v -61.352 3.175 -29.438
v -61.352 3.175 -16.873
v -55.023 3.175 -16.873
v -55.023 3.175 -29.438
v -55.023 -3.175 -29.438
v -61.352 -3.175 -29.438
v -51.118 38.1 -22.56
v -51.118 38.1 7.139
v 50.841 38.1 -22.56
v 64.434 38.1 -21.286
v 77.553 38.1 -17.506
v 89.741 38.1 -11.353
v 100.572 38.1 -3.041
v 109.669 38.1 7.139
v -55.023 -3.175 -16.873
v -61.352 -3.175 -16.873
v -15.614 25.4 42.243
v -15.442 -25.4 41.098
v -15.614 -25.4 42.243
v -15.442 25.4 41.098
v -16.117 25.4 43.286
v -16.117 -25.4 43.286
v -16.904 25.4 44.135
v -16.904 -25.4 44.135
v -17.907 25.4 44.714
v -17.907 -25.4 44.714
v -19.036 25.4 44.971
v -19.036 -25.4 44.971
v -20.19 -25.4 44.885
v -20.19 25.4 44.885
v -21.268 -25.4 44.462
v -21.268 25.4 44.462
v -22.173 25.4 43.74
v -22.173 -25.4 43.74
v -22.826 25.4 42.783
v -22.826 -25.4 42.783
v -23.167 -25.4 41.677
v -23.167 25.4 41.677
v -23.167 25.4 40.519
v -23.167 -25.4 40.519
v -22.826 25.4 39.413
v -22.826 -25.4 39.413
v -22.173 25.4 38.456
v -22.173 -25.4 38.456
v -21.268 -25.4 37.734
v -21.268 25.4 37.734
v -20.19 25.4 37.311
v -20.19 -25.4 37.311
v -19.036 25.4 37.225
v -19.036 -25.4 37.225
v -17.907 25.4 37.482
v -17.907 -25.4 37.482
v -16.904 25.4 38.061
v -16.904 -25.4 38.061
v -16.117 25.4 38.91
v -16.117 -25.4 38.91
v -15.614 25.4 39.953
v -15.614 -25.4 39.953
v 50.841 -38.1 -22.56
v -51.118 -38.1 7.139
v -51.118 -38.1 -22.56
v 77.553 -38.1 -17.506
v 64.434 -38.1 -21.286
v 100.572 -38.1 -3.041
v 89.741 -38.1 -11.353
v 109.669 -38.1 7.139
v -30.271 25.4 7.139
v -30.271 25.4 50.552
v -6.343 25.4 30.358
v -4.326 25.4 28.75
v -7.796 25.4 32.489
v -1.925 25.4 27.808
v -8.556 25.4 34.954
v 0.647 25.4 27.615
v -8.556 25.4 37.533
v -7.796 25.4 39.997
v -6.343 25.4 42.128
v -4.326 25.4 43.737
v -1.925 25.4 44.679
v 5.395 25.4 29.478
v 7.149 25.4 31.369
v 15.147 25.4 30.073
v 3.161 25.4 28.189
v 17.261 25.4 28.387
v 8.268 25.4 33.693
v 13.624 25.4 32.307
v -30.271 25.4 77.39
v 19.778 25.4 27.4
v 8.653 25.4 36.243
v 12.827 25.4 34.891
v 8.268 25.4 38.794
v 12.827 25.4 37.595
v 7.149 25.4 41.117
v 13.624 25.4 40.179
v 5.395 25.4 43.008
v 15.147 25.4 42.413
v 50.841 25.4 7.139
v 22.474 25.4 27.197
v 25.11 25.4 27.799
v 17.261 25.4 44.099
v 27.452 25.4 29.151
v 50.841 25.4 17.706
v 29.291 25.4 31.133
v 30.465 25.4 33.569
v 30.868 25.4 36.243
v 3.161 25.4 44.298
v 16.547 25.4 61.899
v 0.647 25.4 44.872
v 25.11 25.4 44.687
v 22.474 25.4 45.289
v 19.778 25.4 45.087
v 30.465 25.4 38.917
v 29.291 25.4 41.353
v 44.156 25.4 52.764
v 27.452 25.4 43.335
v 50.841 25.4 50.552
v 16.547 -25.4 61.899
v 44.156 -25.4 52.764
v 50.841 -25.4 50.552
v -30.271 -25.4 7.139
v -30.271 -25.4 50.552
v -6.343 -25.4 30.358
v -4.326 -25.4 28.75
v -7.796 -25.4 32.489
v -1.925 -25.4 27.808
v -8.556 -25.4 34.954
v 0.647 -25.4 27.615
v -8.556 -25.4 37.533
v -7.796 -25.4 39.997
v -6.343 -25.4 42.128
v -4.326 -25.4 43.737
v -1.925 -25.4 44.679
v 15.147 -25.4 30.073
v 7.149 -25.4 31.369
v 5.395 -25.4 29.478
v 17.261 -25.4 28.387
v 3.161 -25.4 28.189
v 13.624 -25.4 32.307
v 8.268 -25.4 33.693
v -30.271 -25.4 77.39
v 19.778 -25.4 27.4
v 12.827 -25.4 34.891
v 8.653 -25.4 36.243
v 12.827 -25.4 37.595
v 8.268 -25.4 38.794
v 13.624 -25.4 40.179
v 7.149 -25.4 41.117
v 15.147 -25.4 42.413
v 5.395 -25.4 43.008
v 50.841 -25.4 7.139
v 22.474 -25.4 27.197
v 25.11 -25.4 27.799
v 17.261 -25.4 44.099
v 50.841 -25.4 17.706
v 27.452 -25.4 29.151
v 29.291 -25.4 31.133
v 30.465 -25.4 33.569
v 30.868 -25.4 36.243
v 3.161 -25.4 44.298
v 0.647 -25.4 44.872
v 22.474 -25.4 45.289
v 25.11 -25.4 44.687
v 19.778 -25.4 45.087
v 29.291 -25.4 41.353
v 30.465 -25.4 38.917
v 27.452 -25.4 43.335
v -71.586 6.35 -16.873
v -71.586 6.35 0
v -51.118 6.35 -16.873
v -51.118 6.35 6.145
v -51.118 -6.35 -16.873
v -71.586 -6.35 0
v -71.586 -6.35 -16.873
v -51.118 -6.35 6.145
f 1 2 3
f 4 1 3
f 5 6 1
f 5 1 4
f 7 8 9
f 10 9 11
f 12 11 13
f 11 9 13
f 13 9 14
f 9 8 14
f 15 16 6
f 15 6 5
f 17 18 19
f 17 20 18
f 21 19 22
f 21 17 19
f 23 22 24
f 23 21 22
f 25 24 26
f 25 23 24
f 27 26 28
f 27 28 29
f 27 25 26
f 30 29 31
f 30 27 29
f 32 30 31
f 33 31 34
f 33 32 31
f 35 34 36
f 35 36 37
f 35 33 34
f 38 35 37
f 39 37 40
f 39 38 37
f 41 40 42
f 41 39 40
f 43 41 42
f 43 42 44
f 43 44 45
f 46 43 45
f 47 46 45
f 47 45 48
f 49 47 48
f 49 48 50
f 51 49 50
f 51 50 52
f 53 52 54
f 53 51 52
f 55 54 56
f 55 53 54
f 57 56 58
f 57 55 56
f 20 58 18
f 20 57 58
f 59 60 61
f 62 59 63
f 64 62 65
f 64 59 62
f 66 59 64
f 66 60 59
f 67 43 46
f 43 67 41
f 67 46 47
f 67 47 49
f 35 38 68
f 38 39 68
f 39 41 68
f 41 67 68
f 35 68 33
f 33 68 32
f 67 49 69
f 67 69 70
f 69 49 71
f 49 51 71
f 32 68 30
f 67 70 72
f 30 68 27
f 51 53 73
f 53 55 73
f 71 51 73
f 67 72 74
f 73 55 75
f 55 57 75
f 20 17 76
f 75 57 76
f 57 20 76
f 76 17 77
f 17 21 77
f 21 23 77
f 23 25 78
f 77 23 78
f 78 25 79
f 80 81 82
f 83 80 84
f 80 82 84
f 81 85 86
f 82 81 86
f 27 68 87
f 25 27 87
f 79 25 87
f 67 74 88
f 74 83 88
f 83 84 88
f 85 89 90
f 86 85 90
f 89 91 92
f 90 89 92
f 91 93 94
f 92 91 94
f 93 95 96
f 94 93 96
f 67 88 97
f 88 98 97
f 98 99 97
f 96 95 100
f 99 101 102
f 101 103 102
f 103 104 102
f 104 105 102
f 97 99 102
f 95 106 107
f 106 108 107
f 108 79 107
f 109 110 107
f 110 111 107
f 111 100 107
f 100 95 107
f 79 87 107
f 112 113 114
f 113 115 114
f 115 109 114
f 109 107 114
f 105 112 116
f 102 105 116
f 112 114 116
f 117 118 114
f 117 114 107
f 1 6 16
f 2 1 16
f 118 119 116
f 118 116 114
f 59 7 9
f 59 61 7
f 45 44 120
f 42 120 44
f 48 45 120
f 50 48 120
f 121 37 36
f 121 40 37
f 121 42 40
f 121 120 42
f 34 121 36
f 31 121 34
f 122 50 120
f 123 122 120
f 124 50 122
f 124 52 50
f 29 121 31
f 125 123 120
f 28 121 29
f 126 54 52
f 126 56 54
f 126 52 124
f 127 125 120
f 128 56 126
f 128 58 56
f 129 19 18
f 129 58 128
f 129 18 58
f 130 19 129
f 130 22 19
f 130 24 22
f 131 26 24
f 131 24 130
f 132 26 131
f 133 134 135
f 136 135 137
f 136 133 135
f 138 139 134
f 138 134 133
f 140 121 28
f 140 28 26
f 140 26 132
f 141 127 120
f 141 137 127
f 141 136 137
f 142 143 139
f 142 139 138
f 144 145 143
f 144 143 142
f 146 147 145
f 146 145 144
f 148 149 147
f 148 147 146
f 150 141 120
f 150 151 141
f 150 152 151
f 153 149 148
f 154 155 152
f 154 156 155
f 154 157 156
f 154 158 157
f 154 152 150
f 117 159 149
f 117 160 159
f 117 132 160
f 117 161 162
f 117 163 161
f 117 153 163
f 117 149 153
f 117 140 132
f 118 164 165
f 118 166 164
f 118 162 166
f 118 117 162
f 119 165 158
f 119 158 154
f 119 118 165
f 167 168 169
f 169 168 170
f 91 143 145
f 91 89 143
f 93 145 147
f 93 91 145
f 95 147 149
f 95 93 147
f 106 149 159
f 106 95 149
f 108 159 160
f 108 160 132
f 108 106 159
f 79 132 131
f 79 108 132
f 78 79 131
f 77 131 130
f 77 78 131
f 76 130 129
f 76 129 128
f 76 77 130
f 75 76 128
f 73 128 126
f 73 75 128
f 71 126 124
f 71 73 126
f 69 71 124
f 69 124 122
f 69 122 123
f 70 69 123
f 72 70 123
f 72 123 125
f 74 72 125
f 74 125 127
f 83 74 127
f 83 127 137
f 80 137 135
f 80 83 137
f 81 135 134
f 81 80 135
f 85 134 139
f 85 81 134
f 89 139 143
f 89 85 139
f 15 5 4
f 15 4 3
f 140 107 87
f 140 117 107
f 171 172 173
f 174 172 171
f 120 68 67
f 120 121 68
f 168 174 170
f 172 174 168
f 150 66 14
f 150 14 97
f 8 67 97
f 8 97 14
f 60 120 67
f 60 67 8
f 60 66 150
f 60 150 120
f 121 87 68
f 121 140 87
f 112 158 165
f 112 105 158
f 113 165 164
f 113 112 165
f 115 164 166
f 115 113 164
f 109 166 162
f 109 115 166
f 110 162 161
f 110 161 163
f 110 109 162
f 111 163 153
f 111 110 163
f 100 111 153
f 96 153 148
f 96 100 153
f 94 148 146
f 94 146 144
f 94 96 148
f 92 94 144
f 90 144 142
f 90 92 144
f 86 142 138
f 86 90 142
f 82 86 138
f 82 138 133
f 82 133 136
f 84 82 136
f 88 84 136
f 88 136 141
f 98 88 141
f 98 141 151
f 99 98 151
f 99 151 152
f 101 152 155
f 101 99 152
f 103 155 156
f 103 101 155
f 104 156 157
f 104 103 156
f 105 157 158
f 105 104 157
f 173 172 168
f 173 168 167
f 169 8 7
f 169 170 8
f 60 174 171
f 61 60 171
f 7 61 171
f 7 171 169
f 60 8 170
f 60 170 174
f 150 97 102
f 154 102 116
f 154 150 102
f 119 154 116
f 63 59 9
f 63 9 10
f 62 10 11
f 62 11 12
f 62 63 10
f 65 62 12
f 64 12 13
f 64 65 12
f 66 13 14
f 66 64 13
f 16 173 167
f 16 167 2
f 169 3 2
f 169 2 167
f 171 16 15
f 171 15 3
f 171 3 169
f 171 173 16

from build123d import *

# Parameters (mm, degrees)
F1_DEPTH = 38.1
F2_DEPTH = 6.35
F0_W     = 6.3290558755
F0_H     = 12.5651992857
F3_DEPTH = 3.175
F0_R     = 8.6525424745
F0_R_2   = 9.0711492587
F0_W_2   = 5.1460258761
F0_H_2   = 10.5661942953
F0_W_3   = 24.5602354407
F0_W_4   = 26.5593226068
F0_W_5   = 6.9090700396
F0_W_6   = 14.06177961
F0_W_7   = 3.8753339521
F0_R_3   = 3.8842075561
F4_DEPTH = 25.4


with BuildPart() as f1:
    # F0 (on Front) → F1 (new body, symmetric)
    with BuildSketch(Plane.XZ):
        with BuildLine():
            Line((-51.1175096035, -16.873287037), (-51.1175096035, -22.5602444261))
            Line((-51.1175096035, -22.5602444261), (50.8410625258, -22.5602444261))
            ThreePointArc((50.8410625258, -22.5602444261), (83.7910011304, -14.7143733495), (109.6690327028, 7.1393135004))
            Line((109.6690327028, 7.1393135004), (93.1019932032, 7.1393135004))
            Line((93.1019932032, 7.1393135004), (71.9687715173, 7.1393135004))
            Line((71.9687715173, 7.1393135004), (50.8410625258, 7.1393135004))
            Line((50.8410625258, 7.1393135004), (45.6950366497, 7.1393135004))
            Line((45.6950366497, 7.1393135004), (21.134801209, 7.1393135004))
            Line((21.134801209, 7.1393135004), (-5.4245213978, 7.1393135004))
            Line((-5.4245213978, 7.1393135004), (-12.3335914374, 7.1393135004))
            Line((-12.3335914374, 7.1393135004), (-26.3953710475, 7.1393135004))
            Line((-26.3953710475, 7.1393135004), (-30.2707049996, 7.1393135004))
            Line((-30.2707049996, 7.1393135004), (-51.1175096035, 7.1393135004))
            Line((-51.1175096035, 7.1393135004), (-51.1175096035, 6.1453658742))
            Line((-51.1175096035, 6.1453658742), (-51.1175096035, -16.873287037))
        make_face()
    extrude(amount=F1_DEPTH, both=True)

    # F0 (on Front) → F2 (join, symmetric)
    with BuildSketch(Plane.XZ):
        Polygon((-55.0226159394, -16.873287037), (-51.1175096035, -16.873287037), (-51.1175096035, 6.1453658742), (-71.5858340263, 0), (-71.5858340263, -16.873287037), (-61.3516718149, -16.873287037), align=None)
    extrude(amount=F2_DEPTH, both=True)

    # F0 (on Front) → F3 (join, symmetric)
    with BuildSketch(Plane.XZ):
        with Locations((-58.1871438771, -23.1558866799)):
            Rectangle(F0_W, F0_H)
    extrude(amount=F3_DEPTH, both=True)

    # F0 (on Front) → F4 (join, symmetric)
    with BuildSketch(Plane.XZ):
        with BuildLine():
            Line((-30.2707049996, 50.5518508265), (-30.2707049996, 17.7055077956))
            Line((-30.2707049996, 17.7055077956), (-26.3953710475, 17.7055077956))
            Line((-26.3953710475, 17.7055077956), (-26.3953710475, 42.5316623055))
            add(Edge.make_bspline(
                [(-26.3953710475, 42.5316623055), (-25.6086271256, 50.5518508265), (-13.6145753786, 50.5218580365), (-12.3335914374, 42.5316623055)],
                knots=[0, 0, 0, 0, 14.06177961, 14.06177961, 14.06177961, 14.06177961], degree=3))
            Line((-12.3335914374, 42.5316623055), (-12.3335914374, 17.7055077956))
            Line((-12.3335914374, 17.7055077956), (-5.4245213978, 17.7055077956))
            Line((-5.4245213978, 17.7055077956), (21.134801209, 17.7055077956))
            Line((21.134801209, 17.7055077956), (45.6950366497, 17.7055077956))
            Line((45.6950366497, 17.7055077956), (50.8410625258, 17.7055077956))
            Line((50.8410625258, 17.7055077956), (50.8410625258, 50.5518508265))
            Line((50.8410625258, 50.5518508265), (-30.2707049996, 50.5518508265))
        make_face()
        with Locations((0, 36.2432263792)):
            Circle(F0_R, mode=Mode.SUBTRACT)
        with Locations((21.7964369804, 36.2432301044)):
            Circle(F0_R_2, mode=Mode.SUBTRACT)
        with Locations((48.2680495878, 12.422410648)):
            Rectangle(F0_W_2, F0_H_2)
        with Locations((33.4149189293, 12.422410648)):
            Rectangle(F0_W_3, F0_H_2)
        with Locations((7.8551399056, 12.422410648)):
            Rectangle(F0_W_4, F0_H_2)
        with Locations((-8.8790564176, 12.422410648)):
            Rectangle(F0_W_5, F0_H_2)
        with Locations((-19.3644812425, 12.422410648)):
            Rectangle(F0_W_6, F0_H_2)
        with Locations((-28.3330380235, 12.422410648)):
            Rectangle(F0_W_7, F0_H_2)
        with BuildLine():
            Line((-26.3953710475, 42.5316623055), (-26.3953710475, 17.7055077956))
            Line((-26.3953710475, 17.7055077956), (-12.3335914374, 17.7055077956))
            Line((-12.3335914374, 17.7055077956), (-12.3335914374, 42.5316623055))
            add(Edge.make_bspline(
                [(-26.3953710475, 42.5316623055), (-25.6086271256, 50.5518508265), (-13.6145753786, 50.5218580365), (-12.3335914374, 42.5316623055)],
                knots=[0, 0, 0, 0, 14.06177961, 14.06177961, 14.06177961, 14.06177961], degree=3))
        make_face()
        with Locations((-19.3260274827, 41.0979650915)):
            Circle(F0_R_3, mode=Mode.SUBTRACT)
        Polygon((-30.2707049996, 77.3901939392), (-30.2707049996, 50.5518508265), (50.8410625258, 50.5518508265), (44.1557221366, 52.7639029697), (16.5465753325, 61.8992451966), align=None)
    extrude(amount=F4_DEPTH, both=True)


solid = f1.part
